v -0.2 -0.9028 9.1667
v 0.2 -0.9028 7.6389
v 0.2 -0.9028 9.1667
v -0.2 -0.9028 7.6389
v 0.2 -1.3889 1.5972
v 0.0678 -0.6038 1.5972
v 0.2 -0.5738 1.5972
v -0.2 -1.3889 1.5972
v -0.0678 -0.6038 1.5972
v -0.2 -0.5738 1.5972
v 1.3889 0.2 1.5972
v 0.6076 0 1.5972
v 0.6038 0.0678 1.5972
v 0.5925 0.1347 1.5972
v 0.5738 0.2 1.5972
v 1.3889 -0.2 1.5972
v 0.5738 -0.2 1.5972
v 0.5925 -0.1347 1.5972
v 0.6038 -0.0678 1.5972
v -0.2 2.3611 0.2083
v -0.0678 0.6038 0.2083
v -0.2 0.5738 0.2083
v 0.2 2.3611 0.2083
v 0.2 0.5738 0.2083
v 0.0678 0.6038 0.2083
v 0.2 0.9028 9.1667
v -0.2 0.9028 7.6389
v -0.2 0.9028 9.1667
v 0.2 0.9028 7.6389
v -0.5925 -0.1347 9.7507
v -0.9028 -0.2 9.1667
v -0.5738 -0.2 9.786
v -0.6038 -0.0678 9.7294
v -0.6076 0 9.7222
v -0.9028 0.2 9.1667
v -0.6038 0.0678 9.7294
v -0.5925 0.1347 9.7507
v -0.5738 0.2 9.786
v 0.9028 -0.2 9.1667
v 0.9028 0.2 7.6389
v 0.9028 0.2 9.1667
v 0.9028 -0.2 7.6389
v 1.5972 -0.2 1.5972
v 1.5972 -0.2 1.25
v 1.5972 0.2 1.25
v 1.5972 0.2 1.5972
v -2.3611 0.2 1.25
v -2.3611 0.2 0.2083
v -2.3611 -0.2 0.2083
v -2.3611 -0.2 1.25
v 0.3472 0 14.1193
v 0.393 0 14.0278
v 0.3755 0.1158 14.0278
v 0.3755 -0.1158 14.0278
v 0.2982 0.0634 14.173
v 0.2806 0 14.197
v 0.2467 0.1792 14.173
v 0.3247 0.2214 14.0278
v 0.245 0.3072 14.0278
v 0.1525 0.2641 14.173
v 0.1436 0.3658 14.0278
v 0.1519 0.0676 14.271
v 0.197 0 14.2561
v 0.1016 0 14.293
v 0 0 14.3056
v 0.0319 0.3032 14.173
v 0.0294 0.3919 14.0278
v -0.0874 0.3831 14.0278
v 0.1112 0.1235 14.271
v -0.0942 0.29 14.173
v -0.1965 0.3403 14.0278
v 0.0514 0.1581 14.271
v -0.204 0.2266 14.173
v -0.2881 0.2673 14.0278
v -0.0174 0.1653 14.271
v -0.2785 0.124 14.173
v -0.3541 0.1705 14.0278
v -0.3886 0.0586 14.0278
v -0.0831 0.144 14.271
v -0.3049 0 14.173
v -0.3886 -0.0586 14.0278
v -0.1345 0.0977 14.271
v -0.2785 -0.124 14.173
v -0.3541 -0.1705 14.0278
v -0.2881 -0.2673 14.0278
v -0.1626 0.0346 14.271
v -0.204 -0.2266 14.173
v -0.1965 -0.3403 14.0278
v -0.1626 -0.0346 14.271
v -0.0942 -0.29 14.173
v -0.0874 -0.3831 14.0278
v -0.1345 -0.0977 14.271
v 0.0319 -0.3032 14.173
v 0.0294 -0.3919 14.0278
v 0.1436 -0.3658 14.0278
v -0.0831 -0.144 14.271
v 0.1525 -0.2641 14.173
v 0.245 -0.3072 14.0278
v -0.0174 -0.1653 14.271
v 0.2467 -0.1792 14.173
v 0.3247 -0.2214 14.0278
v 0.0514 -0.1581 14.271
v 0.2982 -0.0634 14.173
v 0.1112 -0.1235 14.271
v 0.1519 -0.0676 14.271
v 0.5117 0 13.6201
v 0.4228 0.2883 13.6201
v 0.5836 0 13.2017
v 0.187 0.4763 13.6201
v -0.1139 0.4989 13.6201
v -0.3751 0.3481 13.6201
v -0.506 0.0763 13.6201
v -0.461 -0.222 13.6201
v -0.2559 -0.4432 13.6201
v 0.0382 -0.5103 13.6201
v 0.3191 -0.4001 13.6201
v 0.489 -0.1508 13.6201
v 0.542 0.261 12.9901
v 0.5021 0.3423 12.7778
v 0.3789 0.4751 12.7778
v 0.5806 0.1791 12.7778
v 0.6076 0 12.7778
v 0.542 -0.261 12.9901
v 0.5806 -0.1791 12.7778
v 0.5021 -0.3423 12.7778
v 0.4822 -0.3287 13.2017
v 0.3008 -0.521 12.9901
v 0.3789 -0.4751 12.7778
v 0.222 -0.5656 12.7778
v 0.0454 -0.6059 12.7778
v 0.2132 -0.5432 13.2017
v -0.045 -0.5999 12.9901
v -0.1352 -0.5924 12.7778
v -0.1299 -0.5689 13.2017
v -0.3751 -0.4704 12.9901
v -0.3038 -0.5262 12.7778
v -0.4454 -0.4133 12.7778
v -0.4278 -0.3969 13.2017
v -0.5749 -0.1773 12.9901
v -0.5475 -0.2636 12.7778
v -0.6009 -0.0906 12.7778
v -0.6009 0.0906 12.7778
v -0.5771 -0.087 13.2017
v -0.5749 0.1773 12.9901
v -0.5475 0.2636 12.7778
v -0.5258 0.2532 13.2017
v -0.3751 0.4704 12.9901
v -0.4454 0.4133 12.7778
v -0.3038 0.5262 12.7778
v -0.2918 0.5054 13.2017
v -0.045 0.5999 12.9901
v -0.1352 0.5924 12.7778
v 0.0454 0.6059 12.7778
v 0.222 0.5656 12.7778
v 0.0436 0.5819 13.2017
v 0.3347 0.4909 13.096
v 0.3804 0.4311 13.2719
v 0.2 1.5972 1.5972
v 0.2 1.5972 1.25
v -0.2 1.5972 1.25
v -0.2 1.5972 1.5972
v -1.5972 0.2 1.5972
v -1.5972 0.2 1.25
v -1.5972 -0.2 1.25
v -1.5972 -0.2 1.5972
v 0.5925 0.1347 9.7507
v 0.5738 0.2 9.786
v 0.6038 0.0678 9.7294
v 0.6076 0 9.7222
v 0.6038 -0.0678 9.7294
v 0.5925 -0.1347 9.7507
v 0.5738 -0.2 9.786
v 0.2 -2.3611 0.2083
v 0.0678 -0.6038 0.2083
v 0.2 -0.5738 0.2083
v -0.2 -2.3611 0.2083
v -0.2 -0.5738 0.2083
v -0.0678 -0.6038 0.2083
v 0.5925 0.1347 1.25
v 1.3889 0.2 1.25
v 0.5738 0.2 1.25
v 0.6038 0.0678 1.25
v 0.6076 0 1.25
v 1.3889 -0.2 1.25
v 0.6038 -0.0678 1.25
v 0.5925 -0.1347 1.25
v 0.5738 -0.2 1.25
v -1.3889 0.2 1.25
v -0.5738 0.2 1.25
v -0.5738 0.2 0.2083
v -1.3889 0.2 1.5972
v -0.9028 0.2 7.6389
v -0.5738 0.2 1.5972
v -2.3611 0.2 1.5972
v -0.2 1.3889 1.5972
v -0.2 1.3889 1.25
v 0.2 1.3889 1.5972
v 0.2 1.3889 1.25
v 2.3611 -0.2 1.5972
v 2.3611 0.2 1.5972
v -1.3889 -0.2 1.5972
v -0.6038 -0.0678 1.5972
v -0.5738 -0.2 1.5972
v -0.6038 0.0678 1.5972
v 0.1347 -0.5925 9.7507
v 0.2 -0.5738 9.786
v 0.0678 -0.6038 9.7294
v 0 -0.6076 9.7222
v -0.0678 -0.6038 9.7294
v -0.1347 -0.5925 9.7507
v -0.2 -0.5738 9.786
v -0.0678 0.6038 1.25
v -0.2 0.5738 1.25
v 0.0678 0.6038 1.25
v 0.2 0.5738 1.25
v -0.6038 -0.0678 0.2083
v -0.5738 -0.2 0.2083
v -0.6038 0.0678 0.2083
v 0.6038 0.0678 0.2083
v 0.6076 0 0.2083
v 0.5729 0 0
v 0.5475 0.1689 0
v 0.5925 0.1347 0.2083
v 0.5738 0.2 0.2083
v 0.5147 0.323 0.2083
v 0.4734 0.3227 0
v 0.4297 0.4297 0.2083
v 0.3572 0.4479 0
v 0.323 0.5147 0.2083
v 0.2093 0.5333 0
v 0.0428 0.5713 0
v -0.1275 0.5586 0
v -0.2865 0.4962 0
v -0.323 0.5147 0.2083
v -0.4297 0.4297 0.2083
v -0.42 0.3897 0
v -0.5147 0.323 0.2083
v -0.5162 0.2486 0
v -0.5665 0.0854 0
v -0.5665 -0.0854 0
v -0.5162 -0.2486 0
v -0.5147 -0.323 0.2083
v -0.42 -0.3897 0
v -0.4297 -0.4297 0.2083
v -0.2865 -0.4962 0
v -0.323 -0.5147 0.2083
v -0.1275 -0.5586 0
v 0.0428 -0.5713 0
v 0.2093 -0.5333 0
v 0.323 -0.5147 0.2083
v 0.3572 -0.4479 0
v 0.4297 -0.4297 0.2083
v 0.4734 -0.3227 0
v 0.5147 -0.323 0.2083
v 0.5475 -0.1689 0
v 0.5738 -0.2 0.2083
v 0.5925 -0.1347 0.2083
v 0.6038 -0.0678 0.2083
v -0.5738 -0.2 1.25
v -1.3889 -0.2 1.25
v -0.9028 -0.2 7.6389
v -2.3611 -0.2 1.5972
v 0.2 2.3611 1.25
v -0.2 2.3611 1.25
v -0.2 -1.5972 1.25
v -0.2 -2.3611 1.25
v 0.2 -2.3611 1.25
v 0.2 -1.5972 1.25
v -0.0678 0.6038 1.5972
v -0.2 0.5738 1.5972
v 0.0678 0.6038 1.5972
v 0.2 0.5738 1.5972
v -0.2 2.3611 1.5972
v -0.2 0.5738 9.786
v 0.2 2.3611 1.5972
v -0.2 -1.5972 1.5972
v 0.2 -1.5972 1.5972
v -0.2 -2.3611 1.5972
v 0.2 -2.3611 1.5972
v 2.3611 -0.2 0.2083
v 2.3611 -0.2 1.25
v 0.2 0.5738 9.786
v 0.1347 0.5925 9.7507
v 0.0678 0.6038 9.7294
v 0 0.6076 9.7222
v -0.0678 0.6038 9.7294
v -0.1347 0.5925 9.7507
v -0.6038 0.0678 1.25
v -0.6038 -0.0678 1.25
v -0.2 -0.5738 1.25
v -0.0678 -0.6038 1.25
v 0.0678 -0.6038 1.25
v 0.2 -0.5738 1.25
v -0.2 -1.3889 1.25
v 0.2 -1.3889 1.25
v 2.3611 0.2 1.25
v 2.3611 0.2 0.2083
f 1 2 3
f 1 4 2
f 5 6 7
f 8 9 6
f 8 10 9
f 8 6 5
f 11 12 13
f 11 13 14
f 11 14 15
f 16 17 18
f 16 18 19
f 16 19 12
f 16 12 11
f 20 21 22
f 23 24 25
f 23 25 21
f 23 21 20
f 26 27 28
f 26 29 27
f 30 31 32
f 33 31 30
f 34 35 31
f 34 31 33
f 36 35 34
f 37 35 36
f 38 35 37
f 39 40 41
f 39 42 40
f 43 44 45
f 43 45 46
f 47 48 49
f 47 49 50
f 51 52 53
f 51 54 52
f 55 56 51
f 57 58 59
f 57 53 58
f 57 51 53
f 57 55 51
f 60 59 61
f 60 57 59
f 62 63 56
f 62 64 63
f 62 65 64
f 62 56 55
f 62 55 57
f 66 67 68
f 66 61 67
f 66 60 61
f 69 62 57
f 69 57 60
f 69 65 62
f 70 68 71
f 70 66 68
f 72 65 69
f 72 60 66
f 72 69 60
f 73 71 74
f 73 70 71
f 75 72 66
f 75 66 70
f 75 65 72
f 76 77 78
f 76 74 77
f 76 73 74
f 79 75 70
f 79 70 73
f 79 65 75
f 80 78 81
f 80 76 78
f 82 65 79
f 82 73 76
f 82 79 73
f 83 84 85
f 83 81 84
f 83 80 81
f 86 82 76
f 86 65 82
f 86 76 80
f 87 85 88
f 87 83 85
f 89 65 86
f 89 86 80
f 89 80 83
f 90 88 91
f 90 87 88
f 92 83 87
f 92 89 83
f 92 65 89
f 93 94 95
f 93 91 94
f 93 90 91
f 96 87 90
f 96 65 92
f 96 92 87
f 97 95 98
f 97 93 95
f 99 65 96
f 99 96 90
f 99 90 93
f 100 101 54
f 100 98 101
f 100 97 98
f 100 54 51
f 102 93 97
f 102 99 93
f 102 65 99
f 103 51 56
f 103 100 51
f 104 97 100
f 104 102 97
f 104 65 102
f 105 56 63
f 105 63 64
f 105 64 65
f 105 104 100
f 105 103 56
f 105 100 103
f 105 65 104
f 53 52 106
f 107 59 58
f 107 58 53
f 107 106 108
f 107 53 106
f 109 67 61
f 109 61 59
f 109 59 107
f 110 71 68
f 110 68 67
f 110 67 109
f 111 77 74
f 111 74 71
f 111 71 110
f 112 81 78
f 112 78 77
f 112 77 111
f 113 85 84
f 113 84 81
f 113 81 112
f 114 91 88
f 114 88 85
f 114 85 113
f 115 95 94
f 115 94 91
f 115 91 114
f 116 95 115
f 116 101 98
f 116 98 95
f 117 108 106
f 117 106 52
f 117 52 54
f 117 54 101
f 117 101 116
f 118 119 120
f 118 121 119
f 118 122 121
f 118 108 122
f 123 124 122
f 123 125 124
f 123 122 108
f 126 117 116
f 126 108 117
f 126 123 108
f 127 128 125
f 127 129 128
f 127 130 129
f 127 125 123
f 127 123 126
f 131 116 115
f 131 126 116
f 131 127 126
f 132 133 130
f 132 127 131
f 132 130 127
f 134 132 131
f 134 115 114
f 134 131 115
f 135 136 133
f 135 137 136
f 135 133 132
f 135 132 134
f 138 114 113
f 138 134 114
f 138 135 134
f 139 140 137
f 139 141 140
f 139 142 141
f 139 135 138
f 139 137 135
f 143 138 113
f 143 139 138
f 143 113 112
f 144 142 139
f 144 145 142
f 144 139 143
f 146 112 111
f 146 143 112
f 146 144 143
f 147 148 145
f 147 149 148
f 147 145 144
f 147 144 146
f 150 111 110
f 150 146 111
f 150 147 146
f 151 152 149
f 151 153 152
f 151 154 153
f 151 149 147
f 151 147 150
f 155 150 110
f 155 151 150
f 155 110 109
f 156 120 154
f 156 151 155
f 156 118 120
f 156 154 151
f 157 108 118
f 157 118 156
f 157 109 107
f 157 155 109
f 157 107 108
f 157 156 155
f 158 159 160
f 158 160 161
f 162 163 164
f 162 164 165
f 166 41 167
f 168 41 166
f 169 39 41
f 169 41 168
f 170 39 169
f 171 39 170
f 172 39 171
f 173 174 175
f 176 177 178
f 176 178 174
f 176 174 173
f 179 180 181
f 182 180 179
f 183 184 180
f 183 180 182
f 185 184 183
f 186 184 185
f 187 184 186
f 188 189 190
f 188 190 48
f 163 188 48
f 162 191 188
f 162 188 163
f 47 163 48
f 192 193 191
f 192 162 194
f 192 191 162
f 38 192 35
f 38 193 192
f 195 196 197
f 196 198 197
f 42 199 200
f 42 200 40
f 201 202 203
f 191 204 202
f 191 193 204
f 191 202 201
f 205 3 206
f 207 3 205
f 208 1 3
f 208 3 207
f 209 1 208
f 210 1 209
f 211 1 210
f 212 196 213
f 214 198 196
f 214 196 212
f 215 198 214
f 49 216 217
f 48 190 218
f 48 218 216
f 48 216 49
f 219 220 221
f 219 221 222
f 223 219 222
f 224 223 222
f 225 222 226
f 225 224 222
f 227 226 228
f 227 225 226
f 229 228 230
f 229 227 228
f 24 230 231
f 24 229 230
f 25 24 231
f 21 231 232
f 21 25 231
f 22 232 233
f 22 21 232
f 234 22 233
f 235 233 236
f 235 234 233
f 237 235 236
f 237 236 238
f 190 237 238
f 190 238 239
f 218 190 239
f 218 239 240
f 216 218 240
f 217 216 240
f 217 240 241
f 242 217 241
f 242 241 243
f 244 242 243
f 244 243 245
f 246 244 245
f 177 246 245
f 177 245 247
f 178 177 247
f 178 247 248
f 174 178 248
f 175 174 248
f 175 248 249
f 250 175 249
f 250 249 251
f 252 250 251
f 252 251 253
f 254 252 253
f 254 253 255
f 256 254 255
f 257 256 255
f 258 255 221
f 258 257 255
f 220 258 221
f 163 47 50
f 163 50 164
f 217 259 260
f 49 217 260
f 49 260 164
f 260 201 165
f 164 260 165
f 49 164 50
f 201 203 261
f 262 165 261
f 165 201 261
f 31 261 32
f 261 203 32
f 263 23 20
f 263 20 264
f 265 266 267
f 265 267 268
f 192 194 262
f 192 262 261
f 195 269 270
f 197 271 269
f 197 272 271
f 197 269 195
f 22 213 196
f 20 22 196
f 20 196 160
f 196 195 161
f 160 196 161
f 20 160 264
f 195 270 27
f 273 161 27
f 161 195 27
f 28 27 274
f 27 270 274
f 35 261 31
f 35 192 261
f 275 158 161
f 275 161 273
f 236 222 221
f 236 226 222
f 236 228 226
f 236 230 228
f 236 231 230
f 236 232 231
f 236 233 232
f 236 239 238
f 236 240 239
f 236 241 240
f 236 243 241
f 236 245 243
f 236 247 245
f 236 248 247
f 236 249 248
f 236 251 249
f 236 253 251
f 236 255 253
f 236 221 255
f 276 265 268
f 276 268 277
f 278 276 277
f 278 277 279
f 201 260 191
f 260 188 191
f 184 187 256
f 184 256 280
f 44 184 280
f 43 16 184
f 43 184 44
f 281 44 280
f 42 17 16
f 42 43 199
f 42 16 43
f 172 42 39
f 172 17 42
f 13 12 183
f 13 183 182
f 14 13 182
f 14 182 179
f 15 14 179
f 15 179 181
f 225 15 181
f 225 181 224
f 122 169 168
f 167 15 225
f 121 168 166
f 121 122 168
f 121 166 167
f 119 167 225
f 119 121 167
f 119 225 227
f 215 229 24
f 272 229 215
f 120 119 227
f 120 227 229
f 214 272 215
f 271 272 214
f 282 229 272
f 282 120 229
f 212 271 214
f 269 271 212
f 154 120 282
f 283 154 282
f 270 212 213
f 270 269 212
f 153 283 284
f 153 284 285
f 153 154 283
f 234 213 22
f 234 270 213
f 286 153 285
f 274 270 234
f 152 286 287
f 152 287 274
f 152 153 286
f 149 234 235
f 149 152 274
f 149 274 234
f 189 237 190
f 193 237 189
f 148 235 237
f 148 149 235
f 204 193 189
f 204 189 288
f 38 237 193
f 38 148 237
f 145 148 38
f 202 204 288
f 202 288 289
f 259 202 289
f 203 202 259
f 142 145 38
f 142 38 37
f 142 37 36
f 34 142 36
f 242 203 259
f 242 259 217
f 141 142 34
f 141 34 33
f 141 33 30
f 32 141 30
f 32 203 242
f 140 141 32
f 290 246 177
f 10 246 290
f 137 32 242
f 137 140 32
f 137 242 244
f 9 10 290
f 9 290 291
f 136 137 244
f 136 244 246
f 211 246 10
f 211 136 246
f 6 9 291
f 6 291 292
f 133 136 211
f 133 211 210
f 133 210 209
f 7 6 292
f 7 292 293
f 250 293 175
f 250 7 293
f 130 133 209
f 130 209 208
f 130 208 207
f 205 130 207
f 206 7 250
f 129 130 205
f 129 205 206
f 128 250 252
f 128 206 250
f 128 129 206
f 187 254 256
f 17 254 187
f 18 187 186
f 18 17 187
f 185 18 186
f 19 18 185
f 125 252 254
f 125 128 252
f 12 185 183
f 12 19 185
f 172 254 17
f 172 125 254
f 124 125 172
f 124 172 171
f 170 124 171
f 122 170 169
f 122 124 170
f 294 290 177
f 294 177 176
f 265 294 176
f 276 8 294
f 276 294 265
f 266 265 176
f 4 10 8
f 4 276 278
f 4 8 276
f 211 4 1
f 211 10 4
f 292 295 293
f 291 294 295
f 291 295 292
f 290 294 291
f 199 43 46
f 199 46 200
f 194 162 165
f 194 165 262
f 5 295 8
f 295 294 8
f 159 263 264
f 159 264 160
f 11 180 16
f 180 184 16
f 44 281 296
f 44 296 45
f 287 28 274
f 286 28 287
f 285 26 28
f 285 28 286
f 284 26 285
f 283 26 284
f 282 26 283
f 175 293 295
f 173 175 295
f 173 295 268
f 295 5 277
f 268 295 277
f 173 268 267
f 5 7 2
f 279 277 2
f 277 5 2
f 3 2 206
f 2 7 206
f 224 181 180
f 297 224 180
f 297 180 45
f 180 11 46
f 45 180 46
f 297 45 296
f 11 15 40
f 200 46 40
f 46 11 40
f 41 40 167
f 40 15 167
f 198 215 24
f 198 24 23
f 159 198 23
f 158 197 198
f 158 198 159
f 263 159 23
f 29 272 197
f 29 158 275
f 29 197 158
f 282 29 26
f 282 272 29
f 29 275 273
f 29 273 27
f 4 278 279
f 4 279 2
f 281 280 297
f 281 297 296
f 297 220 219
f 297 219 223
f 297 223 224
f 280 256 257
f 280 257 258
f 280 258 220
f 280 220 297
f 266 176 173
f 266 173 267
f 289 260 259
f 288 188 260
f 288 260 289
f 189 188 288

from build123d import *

# Parameters (mm, degrees)
F2_W     = 0.2083333333
F2_H     = 0.3472222222
F3_DEPTH = 0.2
F4_COUNT = 4


# Not quite as in the source:
# - a feature names something its author has since deleted; it is built from what else it names


with BuildPart() as f1:
    # F0 (on Front) → F1 (revolve)
    with BuildSketch(Plane.XZ):
        with BuildLine():
            Line((0, 14.3055555556), (0, 0))
            Line((0, 0), (0.5729166667, 0))
            Line((0.5729166667, 0), (0.6076388889, 0.2083333333))
            Line((0.6076388889, 0.2083333333), (0.6076388889, 12.7777777778))
            ThreePointArc((0.6076388889, 12.7777777778), (0.5535814562, 13.4119274316), (0.3929690636, 14.0277777778))
            ThreePointArc((0.3929690636, 14.0277777778), (0.2406164888, 14.2290996444), (0, 14.3055555556))
        make_face()
    revolve(axis=Axis((0, 0, 7.1527777778), (0, 0, 1)))

    # F2 (on Front) → F3 (join, symmetric)
    with BuildSketch(Plane.XZ):
        Polygon((0, 10.8660130719), (0, 0.2083333333), (0.6076388889, 0.2083333333), (2.3611111111, 0.2083333333), (2.3611111111, 1.25), (1.5972222222, 1.25), (1.3888888889, 1.25), (0.4, 1.25), (0.4, 1.5972222222), (1.3888888889, 1.5972222222), (1.5972222222, 1.5972222222), (2.3611111111, 1.5972222222), (0.9027777778, 7.6388888889), (0.9027777778, 9.1666666667), align=None)
        with Locations((1.4930555556, 1.4236111111)):
            Rectangle(F2_W, F2_H)
    extrude(amount=F3_DEPTH, both=True)

    # F4: F1 ×4 about axis
    f4_axis = Axis((0, 0, 0.2083333333), (0, 0, 1))


with BuildPart() as f1_1:
    add(f1.part)
    for i in range(1, F4_COUNT):
        add(f1.part.rotate(f4_axis, i * 360 / F4_COUNT))


solid = f1_1.part
